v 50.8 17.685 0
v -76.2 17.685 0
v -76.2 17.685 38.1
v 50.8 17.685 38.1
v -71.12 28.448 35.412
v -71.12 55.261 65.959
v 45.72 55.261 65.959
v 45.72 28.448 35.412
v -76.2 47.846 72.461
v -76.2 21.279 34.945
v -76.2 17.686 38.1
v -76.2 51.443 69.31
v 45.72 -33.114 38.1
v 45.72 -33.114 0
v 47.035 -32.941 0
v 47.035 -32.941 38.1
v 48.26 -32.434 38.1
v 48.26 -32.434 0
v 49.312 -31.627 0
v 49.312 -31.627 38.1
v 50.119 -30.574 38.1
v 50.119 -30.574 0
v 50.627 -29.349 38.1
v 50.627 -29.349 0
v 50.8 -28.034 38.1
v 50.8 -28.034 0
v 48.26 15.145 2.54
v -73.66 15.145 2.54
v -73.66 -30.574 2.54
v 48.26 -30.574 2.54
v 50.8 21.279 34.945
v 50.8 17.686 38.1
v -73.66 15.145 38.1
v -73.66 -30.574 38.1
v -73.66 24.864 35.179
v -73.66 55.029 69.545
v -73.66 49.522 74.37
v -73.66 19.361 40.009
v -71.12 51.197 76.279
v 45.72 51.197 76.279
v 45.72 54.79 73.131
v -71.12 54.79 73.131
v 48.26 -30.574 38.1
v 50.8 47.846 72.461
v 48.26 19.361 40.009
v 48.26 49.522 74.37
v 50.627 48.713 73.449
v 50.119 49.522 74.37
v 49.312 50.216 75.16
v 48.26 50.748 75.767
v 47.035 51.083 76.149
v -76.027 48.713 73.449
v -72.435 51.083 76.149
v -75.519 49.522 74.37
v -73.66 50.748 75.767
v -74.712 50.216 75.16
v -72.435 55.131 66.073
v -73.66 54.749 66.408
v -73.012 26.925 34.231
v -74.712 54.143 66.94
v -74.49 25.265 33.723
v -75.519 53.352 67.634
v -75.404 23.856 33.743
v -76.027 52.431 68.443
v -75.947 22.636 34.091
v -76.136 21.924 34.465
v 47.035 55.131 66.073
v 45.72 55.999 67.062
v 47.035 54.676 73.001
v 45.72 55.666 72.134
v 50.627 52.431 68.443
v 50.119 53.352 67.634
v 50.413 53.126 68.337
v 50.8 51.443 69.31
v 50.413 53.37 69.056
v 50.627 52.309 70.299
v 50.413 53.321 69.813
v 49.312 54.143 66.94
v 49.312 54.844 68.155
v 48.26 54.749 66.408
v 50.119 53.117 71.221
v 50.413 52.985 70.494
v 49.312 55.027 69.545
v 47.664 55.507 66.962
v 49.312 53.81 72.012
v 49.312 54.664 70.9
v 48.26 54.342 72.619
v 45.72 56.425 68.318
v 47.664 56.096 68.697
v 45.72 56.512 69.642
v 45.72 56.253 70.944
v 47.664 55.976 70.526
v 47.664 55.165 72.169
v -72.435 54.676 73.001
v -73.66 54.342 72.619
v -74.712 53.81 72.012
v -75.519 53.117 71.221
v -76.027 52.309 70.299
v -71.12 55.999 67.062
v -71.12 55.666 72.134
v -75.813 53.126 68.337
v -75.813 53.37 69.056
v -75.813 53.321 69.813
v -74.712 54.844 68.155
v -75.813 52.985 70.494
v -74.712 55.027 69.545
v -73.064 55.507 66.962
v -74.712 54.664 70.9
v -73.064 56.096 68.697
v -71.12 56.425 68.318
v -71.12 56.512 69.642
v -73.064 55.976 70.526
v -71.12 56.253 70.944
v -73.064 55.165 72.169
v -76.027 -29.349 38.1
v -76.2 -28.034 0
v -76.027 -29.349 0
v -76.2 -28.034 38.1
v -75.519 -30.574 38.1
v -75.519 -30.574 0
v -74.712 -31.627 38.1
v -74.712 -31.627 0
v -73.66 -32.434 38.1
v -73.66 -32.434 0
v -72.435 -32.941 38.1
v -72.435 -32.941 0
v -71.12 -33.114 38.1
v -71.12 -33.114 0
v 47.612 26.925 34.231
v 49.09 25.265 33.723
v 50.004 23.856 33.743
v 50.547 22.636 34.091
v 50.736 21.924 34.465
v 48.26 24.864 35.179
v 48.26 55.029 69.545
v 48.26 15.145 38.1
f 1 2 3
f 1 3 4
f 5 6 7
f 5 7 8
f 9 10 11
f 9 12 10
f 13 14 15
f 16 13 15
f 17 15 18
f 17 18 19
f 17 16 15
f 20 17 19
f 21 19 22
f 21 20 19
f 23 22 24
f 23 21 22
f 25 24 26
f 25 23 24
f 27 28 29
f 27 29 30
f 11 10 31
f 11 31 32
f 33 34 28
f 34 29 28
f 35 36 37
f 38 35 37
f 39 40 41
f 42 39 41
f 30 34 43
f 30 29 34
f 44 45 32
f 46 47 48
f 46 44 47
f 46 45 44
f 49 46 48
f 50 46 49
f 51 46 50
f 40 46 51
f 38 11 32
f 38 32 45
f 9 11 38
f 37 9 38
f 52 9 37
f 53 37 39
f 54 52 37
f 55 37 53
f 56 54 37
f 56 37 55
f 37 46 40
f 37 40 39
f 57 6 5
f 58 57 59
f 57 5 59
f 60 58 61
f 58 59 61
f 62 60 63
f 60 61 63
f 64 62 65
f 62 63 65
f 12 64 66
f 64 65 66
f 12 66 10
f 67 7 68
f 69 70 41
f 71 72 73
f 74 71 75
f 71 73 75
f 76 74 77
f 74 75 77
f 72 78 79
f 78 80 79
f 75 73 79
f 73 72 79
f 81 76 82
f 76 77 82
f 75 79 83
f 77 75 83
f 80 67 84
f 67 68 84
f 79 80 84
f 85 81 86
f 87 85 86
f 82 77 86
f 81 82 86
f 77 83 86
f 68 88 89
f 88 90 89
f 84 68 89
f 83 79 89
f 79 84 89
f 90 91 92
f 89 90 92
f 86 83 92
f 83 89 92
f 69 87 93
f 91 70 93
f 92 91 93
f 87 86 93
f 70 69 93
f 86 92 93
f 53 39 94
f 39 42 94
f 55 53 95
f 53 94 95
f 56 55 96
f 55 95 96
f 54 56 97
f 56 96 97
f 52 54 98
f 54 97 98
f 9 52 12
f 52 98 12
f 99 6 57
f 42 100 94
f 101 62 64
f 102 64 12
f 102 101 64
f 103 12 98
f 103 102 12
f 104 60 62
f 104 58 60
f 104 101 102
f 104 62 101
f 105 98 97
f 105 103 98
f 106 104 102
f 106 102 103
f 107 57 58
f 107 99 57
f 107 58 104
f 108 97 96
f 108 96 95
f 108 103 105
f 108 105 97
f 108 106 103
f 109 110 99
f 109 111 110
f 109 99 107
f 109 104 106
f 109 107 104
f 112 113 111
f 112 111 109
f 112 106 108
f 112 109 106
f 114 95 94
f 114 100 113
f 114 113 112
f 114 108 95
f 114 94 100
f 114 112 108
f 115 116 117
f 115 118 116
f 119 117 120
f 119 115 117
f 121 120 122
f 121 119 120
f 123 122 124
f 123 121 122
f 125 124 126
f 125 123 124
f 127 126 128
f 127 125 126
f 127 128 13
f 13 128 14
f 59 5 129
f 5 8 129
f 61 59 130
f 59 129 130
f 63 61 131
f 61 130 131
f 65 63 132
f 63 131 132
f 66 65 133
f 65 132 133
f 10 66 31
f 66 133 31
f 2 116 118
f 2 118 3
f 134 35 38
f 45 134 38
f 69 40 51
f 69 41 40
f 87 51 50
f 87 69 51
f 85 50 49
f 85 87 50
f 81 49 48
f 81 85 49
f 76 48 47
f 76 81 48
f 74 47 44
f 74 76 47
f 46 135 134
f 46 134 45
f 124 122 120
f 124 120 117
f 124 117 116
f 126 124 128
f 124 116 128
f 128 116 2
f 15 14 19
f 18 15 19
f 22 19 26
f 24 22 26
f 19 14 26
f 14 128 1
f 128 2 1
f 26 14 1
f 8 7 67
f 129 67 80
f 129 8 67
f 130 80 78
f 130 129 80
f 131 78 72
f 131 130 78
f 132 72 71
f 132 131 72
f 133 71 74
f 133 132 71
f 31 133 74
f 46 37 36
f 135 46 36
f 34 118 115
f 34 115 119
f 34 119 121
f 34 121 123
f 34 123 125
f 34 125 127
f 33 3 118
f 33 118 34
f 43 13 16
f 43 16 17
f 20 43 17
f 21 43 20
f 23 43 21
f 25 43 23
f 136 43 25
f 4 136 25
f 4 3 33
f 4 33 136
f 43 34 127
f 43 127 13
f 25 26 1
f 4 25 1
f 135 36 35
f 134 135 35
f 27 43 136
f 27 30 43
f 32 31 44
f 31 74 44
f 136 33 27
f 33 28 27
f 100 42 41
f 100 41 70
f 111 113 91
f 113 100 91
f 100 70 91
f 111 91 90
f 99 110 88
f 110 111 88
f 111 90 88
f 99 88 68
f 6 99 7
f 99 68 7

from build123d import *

# Parameters (mm, degrees)
F0_W     = 127
F0_H     = 50.8
F1_DEPTH = 38.1
F2_T     = -2.54
F4_DEPTH = 127
F5_T     = -2.54
F6_R     = 5.08
F6_2_R   = 5.08


with BuildPart() as f1:
    # F0 (on Top) → F1 (new body)
    with BuildSketch(Plane.XY):
        with Locations((-12.7, -7.7145)):
            Rectangle(F0_W, F0_H)
    extrude(amount=F1_DEPTH)

    # F2
    f2_openings = [f1.faces().sort_by_distance(p)[0] for p in [
        (-12.7, -7.7145, 38.1),
    ]]
    offset(amount=F2_T, openings=f2_openings)

    # F6
    f6_edges = [f1.edges().sort_by_distance(p)[0] for p in [
        (-76.2, -33.1145, 19.05),
        (50.8, -33.1145, 19.05),
    ]]
    fillet(f6_edges, radius=F6_R)


with BuildPart() as f4:
    # F3 (on face) → F4 (new body)
    with BuildSketch(Plane(origin=(-76.2, 0, 0), x_dir=(0, -1, 0), z_dir=(-1, 0, 0))):
        Polygon((-25.097251, 31.594272), (-17.6855, 38.1), (-51.197143, 76.278655), (-58.615548, 69.780508), align=None)
    extrude(amount=-F4_DEPTH)

    # F5
    f5_openings = [f4.faces().sort_by_distance(p)[0] for p in [
        (-12.7, 34.441321, 57.189328),
    ]]
    offset(amount=F5_T, openings=f5_openings)

    # F6#2
    f6_2_edges = [f4.edges().sort_by_distance(p)[0] for p in [
        (-12.7, 58.615548, 69.780508),
        (50.8, 41.856399, 50.68739),
        (50.8, 54.906346, 73.029582),
        (-76.2, 41.856399, 50.68739),
        (-76.2, 54.906346, 73.029582),
        (-12.7, 25.097251, 31.594272),
    ]]
    fillet(f6_2_edges, radius=F6_2_R)


solid = Compound([f1.part, f4.part])
